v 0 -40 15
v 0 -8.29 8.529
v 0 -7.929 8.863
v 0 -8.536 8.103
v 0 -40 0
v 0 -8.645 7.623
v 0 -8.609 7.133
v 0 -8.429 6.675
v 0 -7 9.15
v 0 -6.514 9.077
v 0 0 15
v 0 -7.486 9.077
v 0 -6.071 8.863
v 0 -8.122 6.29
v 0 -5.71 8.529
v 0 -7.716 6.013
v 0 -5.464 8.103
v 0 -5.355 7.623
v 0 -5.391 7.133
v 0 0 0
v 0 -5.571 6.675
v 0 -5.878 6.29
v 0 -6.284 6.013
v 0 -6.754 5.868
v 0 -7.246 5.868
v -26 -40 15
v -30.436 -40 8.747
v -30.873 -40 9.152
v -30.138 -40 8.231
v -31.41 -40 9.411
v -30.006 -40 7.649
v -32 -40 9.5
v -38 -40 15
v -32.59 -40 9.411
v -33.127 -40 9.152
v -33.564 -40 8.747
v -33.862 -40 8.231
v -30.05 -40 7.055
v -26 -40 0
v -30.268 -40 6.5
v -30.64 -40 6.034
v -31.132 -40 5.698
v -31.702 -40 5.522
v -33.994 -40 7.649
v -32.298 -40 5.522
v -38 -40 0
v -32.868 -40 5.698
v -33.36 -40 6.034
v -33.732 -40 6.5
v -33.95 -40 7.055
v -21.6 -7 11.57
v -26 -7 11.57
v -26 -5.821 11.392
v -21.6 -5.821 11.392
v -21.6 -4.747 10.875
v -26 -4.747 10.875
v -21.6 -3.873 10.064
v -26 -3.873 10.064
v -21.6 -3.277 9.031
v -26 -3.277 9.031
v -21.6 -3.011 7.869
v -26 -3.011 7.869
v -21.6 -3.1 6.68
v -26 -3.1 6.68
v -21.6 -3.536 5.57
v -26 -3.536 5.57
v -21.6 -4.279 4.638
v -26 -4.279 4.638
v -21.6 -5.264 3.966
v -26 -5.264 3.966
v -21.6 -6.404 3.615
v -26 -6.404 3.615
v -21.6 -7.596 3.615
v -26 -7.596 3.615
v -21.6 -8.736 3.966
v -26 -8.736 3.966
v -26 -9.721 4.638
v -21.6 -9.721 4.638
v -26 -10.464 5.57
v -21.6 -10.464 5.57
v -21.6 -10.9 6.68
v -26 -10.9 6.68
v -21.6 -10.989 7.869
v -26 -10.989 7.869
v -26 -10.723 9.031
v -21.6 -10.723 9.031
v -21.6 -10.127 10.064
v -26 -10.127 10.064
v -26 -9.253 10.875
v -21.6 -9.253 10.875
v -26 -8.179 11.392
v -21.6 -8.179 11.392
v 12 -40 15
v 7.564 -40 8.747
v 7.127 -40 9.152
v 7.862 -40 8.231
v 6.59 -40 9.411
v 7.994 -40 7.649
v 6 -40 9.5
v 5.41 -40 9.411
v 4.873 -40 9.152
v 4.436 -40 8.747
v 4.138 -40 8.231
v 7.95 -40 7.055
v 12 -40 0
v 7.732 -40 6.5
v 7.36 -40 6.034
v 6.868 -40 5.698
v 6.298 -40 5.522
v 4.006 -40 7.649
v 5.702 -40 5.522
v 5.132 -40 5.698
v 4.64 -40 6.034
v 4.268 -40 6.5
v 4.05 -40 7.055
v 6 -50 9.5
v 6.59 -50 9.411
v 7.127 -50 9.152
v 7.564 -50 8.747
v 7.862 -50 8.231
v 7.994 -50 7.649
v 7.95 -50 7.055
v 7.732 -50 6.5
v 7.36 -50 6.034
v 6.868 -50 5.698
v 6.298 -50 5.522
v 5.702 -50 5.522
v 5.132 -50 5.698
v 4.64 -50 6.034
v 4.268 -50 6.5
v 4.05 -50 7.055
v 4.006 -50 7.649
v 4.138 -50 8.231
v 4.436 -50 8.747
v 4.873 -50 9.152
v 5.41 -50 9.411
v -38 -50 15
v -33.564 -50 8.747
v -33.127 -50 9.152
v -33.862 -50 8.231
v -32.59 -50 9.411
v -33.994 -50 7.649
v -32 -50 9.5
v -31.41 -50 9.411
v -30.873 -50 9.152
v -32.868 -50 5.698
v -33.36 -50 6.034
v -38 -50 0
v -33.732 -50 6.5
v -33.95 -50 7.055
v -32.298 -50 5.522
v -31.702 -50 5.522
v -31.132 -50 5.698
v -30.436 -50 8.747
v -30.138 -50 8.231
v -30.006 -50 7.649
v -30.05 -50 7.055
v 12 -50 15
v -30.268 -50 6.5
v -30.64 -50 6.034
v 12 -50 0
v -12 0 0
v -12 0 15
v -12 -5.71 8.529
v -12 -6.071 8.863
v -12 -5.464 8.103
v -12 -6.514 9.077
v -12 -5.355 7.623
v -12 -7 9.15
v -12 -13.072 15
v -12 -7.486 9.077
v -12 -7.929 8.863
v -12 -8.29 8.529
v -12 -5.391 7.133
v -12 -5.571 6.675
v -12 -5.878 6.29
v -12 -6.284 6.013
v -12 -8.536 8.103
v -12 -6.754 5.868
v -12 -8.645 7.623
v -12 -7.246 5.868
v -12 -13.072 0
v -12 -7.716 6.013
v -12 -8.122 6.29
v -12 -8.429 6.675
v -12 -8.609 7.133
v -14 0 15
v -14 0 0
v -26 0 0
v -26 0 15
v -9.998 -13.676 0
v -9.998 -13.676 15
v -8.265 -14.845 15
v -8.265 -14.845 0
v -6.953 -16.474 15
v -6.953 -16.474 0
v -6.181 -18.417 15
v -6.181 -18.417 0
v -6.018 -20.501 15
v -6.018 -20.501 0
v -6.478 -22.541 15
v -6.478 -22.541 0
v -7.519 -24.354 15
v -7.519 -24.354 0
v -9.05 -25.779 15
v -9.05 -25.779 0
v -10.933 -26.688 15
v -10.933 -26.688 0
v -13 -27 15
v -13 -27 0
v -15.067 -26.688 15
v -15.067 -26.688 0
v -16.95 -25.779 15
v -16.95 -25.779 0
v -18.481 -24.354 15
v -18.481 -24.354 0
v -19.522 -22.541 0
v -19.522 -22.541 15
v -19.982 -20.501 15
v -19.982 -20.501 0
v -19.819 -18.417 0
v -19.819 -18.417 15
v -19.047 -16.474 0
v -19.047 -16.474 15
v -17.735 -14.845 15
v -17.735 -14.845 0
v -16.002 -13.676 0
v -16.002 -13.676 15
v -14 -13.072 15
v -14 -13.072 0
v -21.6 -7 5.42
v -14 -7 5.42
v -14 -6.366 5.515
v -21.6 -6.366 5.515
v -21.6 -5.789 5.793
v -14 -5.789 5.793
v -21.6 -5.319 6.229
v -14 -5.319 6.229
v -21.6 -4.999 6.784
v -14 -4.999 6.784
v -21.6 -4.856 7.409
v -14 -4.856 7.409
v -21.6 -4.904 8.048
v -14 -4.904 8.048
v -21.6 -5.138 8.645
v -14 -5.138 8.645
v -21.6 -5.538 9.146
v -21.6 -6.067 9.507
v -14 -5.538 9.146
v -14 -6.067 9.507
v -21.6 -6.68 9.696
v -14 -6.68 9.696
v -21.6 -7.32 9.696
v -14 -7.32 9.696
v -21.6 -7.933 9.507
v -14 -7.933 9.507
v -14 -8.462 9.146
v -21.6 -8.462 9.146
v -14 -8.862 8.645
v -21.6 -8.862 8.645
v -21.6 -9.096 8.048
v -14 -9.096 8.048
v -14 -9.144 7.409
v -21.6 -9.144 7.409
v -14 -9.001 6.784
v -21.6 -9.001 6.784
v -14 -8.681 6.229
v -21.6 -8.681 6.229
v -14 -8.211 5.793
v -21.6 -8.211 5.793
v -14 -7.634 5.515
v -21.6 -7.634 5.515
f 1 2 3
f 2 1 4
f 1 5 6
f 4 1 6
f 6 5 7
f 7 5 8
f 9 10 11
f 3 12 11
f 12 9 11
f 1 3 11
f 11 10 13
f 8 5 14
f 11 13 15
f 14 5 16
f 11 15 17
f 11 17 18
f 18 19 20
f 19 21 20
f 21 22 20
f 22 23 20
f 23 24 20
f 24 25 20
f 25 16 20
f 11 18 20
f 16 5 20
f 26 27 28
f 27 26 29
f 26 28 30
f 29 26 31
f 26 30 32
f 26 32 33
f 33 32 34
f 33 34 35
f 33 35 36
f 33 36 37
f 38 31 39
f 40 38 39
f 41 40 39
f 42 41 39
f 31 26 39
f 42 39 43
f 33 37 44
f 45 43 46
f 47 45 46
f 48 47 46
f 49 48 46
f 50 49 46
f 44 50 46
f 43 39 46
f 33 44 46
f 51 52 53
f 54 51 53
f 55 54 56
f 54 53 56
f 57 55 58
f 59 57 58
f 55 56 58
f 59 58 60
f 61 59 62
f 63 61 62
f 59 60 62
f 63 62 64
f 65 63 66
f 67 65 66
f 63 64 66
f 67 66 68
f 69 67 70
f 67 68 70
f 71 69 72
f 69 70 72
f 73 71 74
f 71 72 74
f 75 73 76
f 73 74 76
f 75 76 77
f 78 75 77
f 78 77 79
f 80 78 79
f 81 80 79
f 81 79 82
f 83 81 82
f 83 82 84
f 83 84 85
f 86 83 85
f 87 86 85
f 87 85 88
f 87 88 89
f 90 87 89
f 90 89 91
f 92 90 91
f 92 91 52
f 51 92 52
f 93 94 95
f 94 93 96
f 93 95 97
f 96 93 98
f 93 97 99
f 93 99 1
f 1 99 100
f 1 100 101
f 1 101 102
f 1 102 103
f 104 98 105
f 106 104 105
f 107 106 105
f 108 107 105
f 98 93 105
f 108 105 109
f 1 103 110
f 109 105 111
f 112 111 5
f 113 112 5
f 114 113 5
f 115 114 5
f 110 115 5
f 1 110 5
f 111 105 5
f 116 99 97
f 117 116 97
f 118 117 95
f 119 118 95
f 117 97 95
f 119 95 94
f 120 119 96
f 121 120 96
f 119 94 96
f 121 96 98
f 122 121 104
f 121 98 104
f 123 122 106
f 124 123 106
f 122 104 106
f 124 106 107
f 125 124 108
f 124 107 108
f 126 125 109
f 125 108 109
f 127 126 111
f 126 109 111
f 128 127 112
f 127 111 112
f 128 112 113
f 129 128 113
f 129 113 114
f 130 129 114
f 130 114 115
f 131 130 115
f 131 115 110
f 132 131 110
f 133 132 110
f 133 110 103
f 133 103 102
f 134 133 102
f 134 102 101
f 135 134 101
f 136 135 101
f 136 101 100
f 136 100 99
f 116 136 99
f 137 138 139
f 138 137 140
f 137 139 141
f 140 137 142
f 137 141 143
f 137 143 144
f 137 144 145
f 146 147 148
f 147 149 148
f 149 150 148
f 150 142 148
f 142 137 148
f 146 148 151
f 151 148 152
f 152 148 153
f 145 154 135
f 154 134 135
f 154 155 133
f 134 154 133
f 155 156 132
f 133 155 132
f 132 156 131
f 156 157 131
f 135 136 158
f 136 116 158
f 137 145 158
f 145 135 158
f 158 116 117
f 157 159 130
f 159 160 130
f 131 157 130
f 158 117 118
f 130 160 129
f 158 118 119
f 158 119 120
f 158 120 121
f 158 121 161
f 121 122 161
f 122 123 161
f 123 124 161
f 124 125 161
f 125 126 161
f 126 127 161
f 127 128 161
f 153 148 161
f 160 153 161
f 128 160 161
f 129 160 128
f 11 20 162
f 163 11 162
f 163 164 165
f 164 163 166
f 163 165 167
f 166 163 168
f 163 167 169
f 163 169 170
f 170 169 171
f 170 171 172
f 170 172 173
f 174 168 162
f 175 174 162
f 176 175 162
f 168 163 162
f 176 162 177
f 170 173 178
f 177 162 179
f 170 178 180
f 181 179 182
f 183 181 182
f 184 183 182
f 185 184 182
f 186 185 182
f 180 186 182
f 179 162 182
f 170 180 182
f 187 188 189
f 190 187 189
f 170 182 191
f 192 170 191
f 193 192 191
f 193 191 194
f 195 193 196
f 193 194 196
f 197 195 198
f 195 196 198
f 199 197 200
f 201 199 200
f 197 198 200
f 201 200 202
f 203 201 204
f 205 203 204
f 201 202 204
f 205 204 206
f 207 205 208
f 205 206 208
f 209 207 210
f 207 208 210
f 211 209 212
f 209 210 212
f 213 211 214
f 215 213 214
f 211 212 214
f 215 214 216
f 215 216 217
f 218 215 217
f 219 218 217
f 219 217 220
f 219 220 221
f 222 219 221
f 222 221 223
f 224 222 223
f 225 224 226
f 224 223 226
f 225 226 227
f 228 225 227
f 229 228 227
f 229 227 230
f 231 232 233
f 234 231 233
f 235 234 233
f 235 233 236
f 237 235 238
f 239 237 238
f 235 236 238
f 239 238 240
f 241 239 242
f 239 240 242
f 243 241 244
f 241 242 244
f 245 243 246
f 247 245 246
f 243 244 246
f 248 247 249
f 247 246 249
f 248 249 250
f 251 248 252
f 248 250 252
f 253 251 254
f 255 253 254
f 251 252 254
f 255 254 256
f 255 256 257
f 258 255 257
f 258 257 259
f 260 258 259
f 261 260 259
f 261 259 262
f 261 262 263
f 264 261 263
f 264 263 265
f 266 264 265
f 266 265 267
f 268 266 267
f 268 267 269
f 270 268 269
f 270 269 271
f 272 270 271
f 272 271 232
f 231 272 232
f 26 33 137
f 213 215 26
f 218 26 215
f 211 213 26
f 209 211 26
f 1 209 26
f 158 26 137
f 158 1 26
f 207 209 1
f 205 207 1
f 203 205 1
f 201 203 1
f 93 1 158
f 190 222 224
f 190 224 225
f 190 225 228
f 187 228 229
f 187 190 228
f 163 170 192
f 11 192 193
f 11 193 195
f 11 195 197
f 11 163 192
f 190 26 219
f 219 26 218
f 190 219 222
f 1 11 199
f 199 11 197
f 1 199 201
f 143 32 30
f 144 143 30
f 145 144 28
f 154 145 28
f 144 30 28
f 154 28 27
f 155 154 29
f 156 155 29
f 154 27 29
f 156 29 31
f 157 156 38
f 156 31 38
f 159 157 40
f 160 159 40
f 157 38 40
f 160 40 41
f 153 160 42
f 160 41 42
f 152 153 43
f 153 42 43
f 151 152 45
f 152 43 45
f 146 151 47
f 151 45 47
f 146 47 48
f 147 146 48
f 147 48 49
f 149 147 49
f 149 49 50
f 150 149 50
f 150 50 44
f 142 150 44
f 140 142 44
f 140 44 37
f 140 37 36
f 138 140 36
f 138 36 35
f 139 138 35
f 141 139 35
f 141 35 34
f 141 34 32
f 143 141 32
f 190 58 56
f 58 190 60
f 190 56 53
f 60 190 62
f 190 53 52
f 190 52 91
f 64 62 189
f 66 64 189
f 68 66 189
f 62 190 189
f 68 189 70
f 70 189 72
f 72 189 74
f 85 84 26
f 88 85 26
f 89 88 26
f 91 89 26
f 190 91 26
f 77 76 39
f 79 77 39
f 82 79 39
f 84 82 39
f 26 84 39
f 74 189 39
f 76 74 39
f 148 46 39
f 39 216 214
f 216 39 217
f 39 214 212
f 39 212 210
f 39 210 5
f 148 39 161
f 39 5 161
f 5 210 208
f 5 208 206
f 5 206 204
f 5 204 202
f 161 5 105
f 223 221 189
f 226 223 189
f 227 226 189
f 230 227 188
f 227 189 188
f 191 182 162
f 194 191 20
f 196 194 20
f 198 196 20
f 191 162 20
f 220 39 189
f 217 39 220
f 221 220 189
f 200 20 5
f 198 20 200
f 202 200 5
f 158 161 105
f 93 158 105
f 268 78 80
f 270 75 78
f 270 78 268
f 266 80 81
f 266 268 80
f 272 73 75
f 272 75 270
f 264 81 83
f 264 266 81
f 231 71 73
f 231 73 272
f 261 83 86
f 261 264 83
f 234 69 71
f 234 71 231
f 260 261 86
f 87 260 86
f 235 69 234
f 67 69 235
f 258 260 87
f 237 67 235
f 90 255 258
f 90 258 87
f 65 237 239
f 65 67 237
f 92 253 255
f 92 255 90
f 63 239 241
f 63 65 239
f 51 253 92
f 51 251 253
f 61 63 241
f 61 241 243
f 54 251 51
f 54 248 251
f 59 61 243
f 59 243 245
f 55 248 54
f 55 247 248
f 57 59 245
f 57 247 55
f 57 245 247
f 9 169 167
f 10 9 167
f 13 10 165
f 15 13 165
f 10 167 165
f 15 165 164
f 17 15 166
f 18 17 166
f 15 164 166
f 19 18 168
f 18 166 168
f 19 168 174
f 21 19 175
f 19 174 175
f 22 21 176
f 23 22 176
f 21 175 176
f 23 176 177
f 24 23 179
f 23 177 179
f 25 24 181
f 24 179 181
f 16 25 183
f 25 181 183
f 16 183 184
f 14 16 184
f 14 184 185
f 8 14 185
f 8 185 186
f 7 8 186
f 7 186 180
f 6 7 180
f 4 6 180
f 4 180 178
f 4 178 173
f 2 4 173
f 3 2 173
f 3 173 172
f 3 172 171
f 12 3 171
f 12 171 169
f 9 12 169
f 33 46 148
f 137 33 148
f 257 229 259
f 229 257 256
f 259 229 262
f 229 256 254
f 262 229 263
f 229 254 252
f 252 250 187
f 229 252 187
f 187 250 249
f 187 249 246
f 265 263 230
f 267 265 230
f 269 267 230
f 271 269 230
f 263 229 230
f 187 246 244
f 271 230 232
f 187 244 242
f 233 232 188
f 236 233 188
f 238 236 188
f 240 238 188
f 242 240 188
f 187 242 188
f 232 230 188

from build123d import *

# Parameters (mm, degrees)
BOSS_EXTRUDE1_DEPTH                                = 15
SKETCH5_R                                          = 2
CUT_EXTRUDE3_DEPTH                                 = 15
CHAMBRAGE_POUR_VIS_T_TE_HEXAGONALE_M41_D           = 4.3
CHAMBRAGE_POUR_VIS_T_TE_HEXAGONALE_M41_DEPTH       = 12
CHAMBRAGE_POUR_VIS_T_TE_HEXAGONALE_M41_CBORE_D     = 8
CHAMBRAGE_POUR_VIS_T_TE_HEXAGONALE_M41_CBORE_DEPTH = 4.4
TROU_TARAUD_M41_D                                  = 3.3


with BuildPart() as part:
    # Sketch1 → Boss-Extrude1 (new body)
    with BuildSketch(Plane.XY):
        with BuildLine():
            Line((-26, 0), (-26, -40))
            Line((-26, -40), (-38, -40))
            Line((-38, -40), (-38, -50))
            Line((-38, -50), (12, -50))
            Line((12, -50), (12, -40))
            Line((12, -40), (0, -40))
            Line((0, -40), (0, 0))
            Line((0, 0), (-12, 0))
            Line((-12, 0), (-12, -13.07179677))
            ThreePointArc((-12, -13.07179677), (-13, -27), (-14, -13.07179677))
            Line((-14, -13.07179677), (-14, 0))
            Line((-14, 0), (-26, 0))
        make_face()
    extrude(amount=BOSS_EXTRUDE1_DEPTH)

    # Sketch5 → Cut-Extrude3 (cut)
    with BuildSketch(Plane(origin=(0, -40, 0), x_dir=(1, 0, 0), z_dir=(0, 1, 0))):
        with Locations(Location((6, -7.5, 0), (0, 0, 270))):
            Circle(SKETCH5_R)
        with Locations(Location((-32, -7.5, 0), (0, 0, 270))):
            Circle(SKETCH5_R)
    extrude(amount=-CUT_EXTRUDE3_DEPTH, mode=Mode.SUBTRACT)

    # Chambrage pour vis à tête hexagonale M41
    with Locations(Plane.ZY.offset(26)):
        with Locations((7.569852971, -7)):
            CounterBoreHole(CHAMBRAGE_POUR_VIS_T_TE_HEXAGONALE_M41_D / 2, CHAMBRAGE_POUR_VIS_T_TE_HEXAGONALE_M41_CBORE_D / 2, CHAMBRAGE_POUR_VIS_T_TE_HEXAGONALE_M41_CBORE_DEPTH, depth=CHAMBRAGE_POUR_VIS_T_TE_HEXAGONALE_M41_DEPTH)

    # Trou taraudé M41 (through all)
    with Locations(Plane(origin=(0, 0, 0), x_dir=(0, 0, -1), z_dir=(1, 0, 0))):
        with Locations((-7.5, -7)):
            Hole(TROU_TARAUD_M41_D / 2)


solid = part.part
